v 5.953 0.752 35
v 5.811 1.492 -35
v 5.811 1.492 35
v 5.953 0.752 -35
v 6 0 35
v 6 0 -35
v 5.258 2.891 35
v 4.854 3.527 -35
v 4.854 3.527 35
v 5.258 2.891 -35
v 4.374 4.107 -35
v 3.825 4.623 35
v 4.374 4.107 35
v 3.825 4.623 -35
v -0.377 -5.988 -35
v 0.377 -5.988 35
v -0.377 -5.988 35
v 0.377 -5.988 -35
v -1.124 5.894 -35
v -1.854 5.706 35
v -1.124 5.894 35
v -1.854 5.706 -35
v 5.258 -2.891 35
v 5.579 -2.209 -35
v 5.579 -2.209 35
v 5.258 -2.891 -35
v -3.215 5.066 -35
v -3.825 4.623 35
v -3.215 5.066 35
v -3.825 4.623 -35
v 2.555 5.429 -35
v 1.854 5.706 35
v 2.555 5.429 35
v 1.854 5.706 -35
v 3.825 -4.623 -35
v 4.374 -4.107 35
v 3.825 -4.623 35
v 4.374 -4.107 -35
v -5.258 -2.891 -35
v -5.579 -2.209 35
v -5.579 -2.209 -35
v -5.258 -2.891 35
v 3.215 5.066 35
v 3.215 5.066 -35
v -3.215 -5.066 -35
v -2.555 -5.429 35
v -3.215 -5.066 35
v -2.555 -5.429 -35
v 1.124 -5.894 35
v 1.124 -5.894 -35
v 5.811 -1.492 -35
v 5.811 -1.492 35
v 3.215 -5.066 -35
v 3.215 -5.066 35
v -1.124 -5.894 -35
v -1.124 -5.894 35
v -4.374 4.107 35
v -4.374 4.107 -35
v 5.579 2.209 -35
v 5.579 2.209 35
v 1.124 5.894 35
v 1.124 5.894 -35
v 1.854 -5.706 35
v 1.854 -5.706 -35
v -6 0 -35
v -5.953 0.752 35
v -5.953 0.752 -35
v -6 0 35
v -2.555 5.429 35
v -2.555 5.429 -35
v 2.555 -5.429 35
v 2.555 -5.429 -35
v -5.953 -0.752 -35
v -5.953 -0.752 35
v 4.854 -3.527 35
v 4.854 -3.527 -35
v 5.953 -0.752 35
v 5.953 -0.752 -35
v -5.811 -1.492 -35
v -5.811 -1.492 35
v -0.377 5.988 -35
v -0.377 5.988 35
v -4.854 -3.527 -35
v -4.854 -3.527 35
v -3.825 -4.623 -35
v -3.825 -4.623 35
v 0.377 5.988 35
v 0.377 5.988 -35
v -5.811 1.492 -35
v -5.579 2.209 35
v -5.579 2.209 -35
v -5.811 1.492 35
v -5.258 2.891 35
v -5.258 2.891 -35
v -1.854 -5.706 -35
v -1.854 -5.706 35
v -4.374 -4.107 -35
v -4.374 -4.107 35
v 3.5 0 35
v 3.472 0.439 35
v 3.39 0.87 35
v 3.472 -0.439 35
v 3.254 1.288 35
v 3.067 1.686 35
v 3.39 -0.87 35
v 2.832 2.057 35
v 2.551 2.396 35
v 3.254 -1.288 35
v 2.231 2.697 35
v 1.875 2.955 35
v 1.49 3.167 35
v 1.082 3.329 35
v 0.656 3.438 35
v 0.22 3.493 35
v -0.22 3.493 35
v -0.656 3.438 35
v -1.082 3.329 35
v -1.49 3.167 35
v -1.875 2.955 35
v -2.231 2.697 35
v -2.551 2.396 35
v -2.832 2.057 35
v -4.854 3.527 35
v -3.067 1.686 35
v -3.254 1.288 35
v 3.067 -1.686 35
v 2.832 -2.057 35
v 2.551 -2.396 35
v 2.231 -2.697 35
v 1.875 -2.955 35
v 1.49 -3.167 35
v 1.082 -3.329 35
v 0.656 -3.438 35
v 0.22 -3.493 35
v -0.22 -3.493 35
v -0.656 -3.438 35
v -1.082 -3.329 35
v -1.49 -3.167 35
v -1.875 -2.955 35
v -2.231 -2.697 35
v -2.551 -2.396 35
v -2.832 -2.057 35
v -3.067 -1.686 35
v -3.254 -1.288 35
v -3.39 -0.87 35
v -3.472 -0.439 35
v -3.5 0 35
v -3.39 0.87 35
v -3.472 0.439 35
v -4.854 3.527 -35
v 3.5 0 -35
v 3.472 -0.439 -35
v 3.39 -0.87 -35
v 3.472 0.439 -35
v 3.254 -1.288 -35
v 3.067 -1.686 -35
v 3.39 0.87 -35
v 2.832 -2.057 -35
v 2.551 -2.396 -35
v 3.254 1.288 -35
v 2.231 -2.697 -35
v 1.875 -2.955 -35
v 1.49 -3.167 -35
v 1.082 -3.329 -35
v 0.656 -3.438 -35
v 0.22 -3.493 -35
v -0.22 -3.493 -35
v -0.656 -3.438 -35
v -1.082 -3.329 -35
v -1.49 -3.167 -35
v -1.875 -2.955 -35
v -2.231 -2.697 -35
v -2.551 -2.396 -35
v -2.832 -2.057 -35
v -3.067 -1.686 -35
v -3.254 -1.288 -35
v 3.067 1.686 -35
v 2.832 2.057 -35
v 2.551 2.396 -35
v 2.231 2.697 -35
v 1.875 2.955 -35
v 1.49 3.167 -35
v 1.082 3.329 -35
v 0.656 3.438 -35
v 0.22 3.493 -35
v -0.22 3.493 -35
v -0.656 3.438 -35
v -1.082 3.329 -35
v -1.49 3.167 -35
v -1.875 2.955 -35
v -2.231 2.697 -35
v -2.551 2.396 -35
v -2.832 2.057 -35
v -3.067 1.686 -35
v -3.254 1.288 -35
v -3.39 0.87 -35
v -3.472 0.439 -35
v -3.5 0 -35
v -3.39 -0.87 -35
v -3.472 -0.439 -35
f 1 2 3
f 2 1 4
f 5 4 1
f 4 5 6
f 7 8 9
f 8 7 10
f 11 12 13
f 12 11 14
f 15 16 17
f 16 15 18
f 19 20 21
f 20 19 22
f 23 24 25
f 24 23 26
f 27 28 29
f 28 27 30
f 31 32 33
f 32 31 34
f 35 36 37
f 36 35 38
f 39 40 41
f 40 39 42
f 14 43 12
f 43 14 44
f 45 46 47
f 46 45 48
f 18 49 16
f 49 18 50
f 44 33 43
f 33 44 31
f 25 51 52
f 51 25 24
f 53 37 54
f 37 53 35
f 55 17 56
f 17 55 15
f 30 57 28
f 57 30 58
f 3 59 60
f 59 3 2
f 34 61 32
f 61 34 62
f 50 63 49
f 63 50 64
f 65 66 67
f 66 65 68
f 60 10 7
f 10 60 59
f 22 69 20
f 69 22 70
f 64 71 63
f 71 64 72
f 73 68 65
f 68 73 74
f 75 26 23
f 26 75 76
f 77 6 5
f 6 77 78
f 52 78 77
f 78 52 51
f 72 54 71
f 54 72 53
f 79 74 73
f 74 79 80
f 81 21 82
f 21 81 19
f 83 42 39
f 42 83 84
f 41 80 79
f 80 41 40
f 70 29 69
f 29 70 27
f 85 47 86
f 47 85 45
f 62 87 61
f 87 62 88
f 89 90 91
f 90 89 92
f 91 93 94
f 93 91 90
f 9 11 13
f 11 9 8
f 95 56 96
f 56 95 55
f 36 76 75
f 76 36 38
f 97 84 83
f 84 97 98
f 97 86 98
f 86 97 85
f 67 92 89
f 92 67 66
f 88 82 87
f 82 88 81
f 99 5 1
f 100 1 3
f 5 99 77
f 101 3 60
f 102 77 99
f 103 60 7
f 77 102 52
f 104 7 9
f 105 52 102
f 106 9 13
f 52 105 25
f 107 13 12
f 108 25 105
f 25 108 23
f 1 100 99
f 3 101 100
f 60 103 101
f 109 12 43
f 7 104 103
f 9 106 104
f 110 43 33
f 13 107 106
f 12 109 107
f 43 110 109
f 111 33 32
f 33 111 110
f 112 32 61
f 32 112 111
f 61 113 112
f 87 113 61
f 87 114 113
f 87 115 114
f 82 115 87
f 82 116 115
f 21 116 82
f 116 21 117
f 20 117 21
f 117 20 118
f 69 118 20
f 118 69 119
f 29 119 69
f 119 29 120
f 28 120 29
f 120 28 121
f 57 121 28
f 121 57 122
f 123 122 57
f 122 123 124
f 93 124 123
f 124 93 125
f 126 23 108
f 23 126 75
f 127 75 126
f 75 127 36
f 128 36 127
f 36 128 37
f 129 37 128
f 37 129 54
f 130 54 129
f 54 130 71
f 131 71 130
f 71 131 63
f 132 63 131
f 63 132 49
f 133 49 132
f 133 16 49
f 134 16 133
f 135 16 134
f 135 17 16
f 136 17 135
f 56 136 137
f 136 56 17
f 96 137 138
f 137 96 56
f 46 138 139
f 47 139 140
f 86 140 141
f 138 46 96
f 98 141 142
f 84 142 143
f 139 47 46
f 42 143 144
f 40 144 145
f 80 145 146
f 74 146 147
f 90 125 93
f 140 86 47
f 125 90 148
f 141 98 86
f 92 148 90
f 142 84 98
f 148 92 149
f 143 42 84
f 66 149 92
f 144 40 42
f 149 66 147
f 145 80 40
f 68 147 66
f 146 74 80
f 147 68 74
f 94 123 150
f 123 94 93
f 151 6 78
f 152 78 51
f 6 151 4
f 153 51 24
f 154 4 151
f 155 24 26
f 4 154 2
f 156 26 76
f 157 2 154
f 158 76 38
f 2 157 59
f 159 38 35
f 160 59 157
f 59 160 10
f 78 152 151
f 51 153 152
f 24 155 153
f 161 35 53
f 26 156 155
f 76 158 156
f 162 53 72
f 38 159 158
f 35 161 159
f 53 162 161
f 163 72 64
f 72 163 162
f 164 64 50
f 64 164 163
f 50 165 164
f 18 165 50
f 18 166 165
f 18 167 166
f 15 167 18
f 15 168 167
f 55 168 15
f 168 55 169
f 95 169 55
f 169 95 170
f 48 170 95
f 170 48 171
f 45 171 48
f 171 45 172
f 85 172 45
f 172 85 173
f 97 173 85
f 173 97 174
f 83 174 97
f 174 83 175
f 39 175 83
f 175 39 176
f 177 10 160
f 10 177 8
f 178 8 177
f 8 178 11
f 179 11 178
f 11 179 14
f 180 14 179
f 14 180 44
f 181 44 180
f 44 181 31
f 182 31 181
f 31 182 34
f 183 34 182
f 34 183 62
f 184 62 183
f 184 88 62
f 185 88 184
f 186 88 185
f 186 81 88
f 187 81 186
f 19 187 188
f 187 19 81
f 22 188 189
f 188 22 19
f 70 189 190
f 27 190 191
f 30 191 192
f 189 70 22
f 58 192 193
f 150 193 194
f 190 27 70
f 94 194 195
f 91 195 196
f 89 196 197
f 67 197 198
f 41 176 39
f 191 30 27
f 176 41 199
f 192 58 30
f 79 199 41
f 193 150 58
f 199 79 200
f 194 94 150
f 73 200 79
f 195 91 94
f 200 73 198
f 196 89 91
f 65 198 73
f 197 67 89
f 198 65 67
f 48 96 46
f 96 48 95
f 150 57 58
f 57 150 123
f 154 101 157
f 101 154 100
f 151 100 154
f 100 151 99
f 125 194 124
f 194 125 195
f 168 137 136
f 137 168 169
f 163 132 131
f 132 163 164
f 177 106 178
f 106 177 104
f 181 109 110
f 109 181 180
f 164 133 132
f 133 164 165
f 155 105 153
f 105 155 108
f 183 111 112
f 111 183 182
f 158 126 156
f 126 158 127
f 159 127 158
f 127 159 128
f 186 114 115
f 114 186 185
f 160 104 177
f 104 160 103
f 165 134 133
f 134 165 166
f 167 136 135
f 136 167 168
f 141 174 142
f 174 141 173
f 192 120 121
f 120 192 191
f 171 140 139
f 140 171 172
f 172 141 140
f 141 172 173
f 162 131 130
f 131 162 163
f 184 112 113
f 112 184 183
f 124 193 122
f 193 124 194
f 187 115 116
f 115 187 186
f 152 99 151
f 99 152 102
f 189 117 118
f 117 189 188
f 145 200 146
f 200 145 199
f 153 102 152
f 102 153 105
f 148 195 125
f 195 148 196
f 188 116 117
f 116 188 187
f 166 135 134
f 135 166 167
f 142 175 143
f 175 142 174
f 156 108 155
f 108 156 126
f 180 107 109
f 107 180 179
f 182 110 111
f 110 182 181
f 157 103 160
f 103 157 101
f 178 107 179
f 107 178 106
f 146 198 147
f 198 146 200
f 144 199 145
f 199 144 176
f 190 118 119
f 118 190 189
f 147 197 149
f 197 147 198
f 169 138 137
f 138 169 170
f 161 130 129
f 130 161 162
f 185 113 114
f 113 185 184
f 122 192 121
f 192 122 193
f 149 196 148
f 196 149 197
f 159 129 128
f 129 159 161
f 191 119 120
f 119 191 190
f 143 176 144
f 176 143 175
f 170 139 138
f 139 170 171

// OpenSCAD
$fn = 50;


difference() {
	union() {
		translate(v = [0, 0, -35.0000000000]) {
			cylinder(h = 70, r = 6.0000000000);
		}
	}
	union() {
		translate(v = [0, 0, -100.0000000000]) {
			cylinder(h = 200, r = 3.5000000000);
		}
	}
}
